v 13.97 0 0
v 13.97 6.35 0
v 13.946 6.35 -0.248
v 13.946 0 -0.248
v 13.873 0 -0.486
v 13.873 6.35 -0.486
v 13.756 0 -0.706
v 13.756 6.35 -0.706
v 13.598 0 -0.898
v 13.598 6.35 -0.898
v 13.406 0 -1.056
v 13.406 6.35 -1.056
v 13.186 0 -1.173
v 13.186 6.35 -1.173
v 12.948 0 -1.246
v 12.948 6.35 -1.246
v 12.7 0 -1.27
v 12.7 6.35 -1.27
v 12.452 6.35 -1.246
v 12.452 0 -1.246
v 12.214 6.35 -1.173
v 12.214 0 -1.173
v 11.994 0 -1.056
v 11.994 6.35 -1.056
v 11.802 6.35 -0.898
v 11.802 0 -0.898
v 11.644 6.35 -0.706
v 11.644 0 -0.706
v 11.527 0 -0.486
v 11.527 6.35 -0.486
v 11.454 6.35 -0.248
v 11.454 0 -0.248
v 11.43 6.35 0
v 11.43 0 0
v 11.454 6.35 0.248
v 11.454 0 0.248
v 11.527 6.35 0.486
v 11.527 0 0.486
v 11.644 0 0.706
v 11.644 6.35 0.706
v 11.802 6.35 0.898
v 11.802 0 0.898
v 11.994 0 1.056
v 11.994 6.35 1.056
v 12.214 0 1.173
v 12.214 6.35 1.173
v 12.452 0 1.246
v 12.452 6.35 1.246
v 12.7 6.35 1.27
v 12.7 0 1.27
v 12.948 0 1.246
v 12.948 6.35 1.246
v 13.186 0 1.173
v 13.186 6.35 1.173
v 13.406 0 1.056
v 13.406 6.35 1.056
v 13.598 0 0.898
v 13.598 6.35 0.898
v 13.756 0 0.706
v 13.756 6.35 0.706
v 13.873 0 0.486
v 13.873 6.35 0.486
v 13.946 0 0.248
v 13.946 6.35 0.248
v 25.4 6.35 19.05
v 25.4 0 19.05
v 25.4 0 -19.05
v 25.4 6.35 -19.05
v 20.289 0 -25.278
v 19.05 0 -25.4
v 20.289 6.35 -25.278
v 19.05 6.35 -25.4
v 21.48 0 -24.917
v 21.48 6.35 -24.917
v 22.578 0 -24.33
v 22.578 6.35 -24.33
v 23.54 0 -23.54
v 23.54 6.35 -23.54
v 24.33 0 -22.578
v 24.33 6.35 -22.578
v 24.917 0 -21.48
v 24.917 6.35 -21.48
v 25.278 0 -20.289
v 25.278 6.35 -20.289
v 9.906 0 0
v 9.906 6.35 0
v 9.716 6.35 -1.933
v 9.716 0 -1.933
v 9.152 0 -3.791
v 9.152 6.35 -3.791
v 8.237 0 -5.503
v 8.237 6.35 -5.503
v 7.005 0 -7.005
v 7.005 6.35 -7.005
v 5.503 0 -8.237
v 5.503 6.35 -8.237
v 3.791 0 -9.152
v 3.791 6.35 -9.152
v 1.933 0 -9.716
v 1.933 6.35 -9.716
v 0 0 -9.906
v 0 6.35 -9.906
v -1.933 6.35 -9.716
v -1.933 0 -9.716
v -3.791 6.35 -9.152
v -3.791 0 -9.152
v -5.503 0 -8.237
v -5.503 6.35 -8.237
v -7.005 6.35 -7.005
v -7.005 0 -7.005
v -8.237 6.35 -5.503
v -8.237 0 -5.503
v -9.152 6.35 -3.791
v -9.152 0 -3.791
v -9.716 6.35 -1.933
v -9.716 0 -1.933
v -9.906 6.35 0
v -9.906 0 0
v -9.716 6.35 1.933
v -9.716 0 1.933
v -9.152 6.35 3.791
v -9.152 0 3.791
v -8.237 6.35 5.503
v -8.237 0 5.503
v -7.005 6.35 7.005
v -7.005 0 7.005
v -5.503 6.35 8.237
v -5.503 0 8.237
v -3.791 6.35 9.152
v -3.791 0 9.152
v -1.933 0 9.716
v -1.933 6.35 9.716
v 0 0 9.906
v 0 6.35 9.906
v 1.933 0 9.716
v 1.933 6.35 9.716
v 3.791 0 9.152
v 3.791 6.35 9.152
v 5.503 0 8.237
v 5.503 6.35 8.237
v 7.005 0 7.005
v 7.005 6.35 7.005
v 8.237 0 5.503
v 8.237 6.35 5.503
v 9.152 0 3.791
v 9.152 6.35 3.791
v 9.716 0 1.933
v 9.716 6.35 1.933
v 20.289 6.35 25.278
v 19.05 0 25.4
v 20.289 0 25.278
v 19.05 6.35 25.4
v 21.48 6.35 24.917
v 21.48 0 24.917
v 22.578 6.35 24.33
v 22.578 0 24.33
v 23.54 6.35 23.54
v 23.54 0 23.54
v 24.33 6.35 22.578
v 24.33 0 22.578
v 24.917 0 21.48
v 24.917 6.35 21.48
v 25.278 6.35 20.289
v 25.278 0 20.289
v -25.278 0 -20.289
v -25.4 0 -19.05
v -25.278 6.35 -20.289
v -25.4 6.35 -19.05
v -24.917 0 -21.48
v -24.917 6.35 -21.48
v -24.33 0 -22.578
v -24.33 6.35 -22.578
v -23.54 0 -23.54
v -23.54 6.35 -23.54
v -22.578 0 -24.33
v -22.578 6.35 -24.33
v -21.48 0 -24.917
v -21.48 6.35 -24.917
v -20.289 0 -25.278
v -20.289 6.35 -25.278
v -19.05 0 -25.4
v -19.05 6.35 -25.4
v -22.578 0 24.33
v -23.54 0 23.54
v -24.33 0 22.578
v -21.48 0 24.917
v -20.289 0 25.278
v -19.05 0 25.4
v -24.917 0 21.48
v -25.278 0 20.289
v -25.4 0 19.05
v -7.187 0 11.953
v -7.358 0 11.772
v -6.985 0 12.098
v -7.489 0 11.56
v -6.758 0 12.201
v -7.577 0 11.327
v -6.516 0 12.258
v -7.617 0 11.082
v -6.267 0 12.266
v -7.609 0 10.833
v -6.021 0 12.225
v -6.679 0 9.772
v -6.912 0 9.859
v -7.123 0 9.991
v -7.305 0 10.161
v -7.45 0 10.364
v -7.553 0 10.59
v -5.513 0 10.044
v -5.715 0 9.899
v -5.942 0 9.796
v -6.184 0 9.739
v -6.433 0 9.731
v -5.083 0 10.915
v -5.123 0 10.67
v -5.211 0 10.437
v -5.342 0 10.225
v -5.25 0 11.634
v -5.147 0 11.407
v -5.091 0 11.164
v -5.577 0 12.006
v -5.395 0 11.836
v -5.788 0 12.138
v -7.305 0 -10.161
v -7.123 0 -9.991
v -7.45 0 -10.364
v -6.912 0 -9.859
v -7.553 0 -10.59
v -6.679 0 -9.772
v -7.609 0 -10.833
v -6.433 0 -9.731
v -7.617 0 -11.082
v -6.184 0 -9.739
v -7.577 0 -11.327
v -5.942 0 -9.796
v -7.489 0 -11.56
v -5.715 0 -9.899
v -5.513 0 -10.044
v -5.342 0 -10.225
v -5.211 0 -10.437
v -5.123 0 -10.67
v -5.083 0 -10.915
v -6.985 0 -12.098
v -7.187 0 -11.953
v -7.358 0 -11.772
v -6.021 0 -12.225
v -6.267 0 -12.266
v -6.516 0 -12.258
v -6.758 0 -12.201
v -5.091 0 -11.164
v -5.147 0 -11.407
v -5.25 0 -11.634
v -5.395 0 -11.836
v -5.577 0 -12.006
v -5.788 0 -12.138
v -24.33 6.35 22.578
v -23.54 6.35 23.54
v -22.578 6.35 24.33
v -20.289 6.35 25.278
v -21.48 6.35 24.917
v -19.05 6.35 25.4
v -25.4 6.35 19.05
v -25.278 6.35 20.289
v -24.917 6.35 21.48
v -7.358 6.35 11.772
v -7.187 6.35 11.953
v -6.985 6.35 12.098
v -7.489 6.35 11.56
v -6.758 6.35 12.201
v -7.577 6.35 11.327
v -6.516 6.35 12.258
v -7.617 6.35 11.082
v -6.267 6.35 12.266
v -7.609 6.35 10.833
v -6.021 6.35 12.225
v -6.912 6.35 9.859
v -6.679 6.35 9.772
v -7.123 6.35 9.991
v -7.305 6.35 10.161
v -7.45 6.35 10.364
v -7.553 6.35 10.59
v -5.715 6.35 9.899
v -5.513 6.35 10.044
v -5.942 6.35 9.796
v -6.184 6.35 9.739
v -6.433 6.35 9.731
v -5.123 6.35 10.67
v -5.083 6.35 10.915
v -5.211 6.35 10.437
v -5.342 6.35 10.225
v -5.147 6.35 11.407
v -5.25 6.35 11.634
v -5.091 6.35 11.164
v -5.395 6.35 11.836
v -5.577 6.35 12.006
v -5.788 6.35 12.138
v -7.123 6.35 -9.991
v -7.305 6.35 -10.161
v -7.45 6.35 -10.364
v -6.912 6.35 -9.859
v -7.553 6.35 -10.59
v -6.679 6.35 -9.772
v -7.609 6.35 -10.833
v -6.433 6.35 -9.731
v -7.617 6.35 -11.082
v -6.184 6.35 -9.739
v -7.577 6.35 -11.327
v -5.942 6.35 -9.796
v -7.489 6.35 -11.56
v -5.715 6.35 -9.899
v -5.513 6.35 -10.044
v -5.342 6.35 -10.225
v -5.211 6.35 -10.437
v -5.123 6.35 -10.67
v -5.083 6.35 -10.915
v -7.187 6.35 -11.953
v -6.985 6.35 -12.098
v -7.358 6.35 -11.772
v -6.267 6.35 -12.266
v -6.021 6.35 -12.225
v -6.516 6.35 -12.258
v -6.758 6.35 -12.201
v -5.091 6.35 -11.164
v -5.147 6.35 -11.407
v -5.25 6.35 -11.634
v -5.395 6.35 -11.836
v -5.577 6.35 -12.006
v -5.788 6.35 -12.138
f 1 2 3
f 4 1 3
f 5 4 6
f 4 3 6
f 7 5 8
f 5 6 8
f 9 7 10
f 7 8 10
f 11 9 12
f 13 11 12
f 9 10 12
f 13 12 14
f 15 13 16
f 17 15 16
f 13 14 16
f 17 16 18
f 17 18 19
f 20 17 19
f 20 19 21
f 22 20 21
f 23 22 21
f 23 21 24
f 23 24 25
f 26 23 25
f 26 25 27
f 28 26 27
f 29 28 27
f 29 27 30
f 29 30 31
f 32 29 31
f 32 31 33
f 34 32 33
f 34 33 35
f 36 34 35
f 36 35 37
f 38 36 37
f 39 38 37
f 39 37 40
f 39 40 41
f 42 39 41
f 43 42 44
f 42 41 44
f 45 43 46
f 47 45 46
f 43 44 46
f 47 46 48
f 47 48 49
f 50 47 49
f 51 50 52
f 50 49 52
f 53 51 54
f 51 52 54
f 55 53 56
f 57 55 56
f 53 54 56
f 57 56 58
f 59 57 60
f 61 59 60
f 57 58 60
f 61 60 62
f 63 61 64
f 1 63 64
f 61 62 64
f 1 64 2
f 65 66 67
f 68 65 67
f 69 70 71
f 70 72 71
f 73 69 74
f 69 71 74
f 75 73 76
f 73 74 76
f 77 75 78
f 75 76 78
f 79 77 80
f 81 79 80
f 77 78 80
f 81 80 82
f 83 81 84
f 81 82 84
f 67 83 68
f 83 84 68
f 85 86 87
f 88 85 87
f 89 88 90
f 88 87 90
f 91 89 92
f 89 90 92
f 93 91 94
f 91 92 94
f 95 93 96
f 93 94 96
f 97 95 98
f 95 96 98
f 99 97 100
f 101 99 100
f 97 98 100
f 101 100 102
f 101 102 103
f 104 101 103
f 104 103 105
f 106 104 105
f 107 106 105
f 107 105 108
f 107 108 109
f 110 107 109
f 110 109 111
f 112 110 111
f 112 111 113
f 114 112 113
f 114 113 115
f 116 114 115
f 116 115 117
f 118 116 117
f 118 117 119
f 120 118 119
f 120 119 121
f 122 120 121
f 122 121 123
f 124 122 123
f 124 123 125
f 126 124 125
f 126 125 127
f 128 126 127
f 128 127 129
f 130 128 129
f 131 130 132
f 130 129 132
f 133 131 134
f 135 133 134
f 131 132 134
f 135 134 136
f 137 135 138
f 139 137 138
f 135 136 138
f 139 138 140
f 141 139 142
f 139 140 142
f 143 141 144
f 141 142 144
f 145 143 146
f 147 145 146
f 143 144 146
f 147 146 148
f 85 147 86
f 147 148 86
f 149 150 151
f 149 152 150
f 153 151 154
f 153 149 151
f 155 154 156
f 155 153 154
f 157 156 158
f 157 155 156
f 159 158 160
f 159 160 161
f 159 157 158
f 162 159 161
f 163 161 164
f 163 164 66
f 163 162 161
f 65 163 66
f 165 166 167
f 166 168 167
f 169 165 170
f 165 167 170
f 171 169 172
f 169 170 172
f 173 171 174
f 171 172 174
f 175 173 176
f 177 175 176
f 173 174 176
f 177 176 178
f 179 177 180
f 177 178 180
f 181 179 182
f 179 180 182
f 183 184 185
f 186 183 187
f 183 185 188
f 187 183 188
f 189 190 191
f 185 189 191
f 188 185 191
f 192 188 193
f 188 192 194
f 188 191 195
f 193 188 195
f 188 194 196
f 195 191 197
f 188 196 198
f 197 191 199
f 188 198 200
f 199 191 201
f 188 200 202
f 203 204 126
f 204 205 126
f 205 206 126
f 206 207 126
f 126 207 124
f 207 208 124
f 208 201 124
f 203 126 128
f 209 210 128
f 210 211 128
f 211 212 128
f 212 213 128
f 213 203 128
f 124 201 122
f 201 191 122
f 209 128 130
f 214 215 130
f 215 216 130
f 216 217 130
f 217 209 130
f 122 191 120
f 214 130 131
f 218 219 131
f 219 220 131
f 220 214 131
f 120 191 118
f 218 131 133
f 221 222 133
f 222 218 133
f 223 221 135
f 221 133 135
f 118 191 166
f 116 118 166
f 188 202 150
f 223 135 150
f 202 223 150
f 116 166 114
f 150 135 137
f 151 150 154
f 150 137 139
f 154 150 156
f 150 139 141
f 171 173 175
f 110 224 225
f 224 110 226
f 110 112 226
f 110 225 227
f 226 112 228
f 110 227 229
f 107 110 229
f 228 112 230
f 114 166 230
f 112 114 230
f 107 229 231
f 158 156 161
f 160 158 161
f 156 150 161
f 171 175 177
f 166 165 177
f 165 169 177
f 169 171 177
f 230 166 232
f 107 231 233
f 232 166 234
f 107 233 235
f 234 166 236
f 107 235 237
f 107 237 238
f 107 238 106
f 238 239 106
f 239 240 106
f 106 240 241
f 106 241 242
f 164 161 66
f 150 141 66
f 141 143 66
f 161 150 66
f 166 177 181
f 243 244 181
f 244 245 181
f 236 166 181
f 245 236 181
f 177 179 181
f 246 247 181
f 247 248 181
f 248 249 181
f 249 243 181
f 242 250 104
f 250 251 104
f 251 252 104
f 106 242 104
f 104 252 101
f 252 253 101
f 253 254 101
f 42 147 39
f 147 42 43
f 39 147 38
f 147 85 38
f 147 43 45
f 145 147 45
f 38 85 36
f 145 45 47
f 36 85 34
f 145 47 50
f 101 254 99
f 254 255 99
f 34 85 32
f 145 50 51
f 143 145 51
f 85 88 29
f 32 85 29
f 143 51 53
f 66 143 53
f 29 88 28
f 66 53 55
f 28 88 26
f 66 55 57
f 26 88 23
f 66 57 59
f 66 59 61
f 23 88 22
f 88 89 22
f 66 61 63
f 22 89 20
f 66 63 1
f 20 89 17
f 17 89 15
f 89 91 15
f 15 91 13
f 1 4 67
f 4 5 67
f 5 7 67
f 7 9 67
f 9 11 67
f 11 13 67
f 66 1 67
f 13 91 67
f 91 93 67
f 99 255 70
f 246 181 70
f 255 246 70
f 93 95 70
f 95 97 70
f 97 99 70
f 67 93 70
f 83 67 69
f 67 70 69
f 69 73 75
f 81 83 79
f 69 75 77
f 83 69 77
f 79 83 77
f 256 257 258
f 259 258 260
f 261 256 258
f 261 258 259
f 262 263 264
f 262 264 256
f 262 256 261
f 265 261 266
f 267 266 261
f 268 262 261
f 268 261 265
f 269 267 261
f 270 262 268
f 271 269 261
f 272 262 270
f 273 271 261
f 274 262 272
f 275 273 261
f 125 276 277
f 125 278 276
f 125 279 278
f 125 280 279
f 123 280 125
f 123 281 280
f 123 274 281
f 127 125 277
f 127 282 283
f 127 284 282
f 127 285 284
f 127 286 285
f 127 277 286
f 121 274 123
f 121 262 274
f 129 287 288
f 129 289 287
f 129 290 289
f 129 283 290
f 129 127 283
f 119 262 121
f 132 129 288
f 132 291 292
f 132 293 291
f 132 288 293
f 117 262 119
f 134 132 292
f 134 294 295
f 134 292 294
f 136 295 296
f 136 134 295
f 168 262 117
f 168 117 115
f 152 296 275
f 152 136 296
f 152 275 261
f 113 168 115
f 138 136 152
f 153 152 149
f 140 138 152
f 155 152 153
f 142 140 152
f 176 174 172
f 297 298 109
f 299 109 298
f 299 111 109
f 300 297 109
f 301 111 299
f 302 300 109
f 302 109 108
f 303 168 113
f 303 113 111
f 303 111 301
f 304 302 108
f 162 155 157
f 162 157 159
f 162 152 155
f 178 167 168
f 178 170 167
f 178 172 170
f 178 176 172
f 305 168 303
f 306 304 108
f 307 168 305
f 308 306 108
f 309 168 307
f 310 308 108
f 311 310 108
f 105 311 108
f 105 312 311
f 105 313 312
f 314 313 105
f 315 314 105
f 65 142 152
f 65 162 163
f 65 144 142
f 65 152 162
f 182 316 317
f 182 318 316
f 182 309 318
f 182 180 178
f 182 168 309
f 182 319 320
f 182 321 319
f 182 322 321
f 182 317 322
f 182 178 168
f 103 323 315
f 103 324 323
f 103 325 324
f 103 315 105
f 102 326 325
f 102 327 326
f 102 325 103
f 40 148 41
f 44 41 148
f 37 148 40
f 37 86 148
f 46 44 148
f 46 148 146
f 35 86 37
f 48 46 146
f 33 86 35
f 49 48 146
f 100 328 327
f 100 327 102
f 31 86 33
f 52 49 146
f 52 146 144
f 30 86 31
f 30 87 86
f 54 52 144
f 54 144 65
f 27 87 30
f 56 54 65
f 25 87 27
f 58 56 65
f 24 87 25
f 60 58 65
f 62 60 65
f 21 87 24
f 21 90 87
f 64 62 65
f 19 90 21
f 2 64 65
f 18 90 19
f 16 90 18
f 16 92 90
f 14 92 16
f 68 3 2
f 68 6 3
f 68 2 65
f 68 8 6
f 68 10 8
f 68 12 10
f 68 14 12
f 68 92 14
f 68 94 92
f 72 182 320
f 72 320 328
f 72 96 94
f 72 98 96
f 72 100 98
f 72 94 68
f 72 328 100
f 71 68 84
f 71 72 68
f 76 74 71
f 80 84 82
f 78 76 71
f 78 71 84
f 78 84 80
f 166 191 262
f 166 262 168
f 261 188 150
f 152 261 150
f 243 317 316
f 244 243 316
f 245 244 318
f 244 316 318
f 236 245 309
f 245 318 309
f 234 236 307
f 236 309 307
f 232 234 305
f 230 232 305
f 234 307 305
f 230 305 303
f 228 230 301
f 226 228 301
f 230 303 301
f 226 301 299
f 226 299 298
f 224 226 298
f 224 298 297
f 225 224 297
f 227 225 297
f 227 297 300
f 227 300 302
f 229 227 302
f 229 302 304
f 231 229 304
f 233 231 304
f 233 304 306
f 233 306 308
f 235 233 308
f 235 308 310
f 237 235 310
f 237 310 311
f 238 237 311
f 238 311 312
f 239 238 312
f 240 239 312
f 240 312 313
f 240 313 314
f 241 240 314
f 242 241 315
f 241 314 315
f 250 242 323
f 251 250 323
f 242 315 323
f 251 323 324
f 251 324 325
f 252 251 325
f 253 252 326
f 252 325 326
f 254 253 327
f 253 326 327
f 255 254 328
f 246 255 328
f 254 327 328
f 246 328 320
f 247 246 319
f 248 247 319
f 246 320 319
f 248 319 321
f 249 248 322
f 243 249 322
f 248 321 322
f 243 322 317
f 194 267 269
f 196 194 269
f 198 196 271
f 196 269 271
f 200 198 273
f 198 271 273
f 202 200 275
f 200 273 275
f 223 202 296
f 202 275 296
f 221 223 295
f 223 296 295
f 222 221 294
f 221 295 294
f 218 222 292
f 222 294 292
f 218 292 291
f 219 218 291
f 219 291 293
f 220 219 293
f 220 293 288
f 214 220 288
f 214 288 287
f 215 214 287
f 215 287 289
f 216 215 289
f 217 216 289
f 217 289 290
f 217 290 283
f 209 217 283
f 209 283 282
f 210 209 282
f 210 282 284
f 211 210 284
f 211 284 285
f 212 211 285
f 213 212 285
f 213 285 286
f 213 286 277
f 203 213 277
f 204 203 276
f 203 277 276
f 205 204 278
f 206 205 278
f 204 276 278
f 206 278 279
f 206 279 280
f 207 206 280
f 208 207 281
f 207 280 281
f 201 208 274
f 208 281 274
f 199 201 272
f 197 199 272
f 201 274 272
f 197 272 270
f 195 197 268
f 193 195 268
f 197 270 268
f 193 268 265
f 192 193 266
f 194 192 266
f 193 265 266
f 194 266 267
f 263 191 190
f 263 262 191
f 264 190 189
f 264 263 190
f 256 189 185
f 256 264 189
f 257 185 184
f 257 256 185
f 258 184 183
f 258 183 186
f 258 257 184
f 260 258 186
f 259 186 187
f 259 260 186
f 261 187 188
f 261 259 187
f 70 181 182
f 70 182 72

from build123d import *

# Parameters (mm, degrees)
SKETCH1_W           = 50.8
SKETCH1_H           = 50.8
BOSS_EXTRUDE1_DEPTH = 6.35
SKETCH2_R           = 9.906
CUT_EXTRUDE1_DEPTH  = 7.35
SKETCH3_R           = 1.27
CUT_EXTRUDE2_DEPTH  = 7.35
CIRPATTERN1_COUNT   = 3
FILLET1_R           = 6.35


with BuildPart() as part:
    # Sketch1 → Boss-Extrude1 (new body)
    with BuildSketch(Plane(origin=(0, 0, 0), x_dir=(1, 0, 0), z_dir=(0, 1, 0))):
        Rectangle(SKETCH1_W, SKETCH1_H)
    extrude(amount=BOSS_EXTRUDE1_DEPTH)

    # Sketch2 → Cut-Extrude1 (cut, through all)
    with BuildSketch(Plane(origin=(0, 6.35, 0), x_dir=(1, 0, 0), z_dir=(0, 1, 0))):
        Circle(SKETCH2_R)
    extrude(amount=-CUT_EXTRUDE1_DEPTH, mode=Mode.SUBTRACT)

    # Sketch3 → Cut-Extrude2 (cut, through all)
    with BuildSketch(Plane(origin=(0, 6.35, 0), x_dir=(1, 0, 0), z_dir=(0, 1, 0))):
        with Locations((12.7, 0)):
            Circle(SKETCH3_R)
    cut_extrude2 = extrude(amount=-CUT_EXTRUDE2_DEPTH, mode=Mode.SUBTRACT)

    # CirPattern1: Cut-Extrude2 ×3 about axis
    cirpattern1_axis = Axis((0, 0, 0), (0, 1, 0))
    for i in range(1, CIRPATTERN1_COUNT):
        add(cut_extrude2.rotate(cirpattern1_axis, i * 360 / CIRPATTERN1_COUNT), mode=Mode.SUBTRACT)

    # Fillet1
    fillet1_edges = [part.edges().sort_by_distance(p)[0] for p in [
        (25.4, 3.175, 25.4),
        (-25.4, 3.175, 25.4),
        (-25.4, 3.175, -25.4),
        (25.4, 3.175, -25.4),
    ]]
    fillet(fillet1_edges, radius=FILLET1_R)


solid = part.part
